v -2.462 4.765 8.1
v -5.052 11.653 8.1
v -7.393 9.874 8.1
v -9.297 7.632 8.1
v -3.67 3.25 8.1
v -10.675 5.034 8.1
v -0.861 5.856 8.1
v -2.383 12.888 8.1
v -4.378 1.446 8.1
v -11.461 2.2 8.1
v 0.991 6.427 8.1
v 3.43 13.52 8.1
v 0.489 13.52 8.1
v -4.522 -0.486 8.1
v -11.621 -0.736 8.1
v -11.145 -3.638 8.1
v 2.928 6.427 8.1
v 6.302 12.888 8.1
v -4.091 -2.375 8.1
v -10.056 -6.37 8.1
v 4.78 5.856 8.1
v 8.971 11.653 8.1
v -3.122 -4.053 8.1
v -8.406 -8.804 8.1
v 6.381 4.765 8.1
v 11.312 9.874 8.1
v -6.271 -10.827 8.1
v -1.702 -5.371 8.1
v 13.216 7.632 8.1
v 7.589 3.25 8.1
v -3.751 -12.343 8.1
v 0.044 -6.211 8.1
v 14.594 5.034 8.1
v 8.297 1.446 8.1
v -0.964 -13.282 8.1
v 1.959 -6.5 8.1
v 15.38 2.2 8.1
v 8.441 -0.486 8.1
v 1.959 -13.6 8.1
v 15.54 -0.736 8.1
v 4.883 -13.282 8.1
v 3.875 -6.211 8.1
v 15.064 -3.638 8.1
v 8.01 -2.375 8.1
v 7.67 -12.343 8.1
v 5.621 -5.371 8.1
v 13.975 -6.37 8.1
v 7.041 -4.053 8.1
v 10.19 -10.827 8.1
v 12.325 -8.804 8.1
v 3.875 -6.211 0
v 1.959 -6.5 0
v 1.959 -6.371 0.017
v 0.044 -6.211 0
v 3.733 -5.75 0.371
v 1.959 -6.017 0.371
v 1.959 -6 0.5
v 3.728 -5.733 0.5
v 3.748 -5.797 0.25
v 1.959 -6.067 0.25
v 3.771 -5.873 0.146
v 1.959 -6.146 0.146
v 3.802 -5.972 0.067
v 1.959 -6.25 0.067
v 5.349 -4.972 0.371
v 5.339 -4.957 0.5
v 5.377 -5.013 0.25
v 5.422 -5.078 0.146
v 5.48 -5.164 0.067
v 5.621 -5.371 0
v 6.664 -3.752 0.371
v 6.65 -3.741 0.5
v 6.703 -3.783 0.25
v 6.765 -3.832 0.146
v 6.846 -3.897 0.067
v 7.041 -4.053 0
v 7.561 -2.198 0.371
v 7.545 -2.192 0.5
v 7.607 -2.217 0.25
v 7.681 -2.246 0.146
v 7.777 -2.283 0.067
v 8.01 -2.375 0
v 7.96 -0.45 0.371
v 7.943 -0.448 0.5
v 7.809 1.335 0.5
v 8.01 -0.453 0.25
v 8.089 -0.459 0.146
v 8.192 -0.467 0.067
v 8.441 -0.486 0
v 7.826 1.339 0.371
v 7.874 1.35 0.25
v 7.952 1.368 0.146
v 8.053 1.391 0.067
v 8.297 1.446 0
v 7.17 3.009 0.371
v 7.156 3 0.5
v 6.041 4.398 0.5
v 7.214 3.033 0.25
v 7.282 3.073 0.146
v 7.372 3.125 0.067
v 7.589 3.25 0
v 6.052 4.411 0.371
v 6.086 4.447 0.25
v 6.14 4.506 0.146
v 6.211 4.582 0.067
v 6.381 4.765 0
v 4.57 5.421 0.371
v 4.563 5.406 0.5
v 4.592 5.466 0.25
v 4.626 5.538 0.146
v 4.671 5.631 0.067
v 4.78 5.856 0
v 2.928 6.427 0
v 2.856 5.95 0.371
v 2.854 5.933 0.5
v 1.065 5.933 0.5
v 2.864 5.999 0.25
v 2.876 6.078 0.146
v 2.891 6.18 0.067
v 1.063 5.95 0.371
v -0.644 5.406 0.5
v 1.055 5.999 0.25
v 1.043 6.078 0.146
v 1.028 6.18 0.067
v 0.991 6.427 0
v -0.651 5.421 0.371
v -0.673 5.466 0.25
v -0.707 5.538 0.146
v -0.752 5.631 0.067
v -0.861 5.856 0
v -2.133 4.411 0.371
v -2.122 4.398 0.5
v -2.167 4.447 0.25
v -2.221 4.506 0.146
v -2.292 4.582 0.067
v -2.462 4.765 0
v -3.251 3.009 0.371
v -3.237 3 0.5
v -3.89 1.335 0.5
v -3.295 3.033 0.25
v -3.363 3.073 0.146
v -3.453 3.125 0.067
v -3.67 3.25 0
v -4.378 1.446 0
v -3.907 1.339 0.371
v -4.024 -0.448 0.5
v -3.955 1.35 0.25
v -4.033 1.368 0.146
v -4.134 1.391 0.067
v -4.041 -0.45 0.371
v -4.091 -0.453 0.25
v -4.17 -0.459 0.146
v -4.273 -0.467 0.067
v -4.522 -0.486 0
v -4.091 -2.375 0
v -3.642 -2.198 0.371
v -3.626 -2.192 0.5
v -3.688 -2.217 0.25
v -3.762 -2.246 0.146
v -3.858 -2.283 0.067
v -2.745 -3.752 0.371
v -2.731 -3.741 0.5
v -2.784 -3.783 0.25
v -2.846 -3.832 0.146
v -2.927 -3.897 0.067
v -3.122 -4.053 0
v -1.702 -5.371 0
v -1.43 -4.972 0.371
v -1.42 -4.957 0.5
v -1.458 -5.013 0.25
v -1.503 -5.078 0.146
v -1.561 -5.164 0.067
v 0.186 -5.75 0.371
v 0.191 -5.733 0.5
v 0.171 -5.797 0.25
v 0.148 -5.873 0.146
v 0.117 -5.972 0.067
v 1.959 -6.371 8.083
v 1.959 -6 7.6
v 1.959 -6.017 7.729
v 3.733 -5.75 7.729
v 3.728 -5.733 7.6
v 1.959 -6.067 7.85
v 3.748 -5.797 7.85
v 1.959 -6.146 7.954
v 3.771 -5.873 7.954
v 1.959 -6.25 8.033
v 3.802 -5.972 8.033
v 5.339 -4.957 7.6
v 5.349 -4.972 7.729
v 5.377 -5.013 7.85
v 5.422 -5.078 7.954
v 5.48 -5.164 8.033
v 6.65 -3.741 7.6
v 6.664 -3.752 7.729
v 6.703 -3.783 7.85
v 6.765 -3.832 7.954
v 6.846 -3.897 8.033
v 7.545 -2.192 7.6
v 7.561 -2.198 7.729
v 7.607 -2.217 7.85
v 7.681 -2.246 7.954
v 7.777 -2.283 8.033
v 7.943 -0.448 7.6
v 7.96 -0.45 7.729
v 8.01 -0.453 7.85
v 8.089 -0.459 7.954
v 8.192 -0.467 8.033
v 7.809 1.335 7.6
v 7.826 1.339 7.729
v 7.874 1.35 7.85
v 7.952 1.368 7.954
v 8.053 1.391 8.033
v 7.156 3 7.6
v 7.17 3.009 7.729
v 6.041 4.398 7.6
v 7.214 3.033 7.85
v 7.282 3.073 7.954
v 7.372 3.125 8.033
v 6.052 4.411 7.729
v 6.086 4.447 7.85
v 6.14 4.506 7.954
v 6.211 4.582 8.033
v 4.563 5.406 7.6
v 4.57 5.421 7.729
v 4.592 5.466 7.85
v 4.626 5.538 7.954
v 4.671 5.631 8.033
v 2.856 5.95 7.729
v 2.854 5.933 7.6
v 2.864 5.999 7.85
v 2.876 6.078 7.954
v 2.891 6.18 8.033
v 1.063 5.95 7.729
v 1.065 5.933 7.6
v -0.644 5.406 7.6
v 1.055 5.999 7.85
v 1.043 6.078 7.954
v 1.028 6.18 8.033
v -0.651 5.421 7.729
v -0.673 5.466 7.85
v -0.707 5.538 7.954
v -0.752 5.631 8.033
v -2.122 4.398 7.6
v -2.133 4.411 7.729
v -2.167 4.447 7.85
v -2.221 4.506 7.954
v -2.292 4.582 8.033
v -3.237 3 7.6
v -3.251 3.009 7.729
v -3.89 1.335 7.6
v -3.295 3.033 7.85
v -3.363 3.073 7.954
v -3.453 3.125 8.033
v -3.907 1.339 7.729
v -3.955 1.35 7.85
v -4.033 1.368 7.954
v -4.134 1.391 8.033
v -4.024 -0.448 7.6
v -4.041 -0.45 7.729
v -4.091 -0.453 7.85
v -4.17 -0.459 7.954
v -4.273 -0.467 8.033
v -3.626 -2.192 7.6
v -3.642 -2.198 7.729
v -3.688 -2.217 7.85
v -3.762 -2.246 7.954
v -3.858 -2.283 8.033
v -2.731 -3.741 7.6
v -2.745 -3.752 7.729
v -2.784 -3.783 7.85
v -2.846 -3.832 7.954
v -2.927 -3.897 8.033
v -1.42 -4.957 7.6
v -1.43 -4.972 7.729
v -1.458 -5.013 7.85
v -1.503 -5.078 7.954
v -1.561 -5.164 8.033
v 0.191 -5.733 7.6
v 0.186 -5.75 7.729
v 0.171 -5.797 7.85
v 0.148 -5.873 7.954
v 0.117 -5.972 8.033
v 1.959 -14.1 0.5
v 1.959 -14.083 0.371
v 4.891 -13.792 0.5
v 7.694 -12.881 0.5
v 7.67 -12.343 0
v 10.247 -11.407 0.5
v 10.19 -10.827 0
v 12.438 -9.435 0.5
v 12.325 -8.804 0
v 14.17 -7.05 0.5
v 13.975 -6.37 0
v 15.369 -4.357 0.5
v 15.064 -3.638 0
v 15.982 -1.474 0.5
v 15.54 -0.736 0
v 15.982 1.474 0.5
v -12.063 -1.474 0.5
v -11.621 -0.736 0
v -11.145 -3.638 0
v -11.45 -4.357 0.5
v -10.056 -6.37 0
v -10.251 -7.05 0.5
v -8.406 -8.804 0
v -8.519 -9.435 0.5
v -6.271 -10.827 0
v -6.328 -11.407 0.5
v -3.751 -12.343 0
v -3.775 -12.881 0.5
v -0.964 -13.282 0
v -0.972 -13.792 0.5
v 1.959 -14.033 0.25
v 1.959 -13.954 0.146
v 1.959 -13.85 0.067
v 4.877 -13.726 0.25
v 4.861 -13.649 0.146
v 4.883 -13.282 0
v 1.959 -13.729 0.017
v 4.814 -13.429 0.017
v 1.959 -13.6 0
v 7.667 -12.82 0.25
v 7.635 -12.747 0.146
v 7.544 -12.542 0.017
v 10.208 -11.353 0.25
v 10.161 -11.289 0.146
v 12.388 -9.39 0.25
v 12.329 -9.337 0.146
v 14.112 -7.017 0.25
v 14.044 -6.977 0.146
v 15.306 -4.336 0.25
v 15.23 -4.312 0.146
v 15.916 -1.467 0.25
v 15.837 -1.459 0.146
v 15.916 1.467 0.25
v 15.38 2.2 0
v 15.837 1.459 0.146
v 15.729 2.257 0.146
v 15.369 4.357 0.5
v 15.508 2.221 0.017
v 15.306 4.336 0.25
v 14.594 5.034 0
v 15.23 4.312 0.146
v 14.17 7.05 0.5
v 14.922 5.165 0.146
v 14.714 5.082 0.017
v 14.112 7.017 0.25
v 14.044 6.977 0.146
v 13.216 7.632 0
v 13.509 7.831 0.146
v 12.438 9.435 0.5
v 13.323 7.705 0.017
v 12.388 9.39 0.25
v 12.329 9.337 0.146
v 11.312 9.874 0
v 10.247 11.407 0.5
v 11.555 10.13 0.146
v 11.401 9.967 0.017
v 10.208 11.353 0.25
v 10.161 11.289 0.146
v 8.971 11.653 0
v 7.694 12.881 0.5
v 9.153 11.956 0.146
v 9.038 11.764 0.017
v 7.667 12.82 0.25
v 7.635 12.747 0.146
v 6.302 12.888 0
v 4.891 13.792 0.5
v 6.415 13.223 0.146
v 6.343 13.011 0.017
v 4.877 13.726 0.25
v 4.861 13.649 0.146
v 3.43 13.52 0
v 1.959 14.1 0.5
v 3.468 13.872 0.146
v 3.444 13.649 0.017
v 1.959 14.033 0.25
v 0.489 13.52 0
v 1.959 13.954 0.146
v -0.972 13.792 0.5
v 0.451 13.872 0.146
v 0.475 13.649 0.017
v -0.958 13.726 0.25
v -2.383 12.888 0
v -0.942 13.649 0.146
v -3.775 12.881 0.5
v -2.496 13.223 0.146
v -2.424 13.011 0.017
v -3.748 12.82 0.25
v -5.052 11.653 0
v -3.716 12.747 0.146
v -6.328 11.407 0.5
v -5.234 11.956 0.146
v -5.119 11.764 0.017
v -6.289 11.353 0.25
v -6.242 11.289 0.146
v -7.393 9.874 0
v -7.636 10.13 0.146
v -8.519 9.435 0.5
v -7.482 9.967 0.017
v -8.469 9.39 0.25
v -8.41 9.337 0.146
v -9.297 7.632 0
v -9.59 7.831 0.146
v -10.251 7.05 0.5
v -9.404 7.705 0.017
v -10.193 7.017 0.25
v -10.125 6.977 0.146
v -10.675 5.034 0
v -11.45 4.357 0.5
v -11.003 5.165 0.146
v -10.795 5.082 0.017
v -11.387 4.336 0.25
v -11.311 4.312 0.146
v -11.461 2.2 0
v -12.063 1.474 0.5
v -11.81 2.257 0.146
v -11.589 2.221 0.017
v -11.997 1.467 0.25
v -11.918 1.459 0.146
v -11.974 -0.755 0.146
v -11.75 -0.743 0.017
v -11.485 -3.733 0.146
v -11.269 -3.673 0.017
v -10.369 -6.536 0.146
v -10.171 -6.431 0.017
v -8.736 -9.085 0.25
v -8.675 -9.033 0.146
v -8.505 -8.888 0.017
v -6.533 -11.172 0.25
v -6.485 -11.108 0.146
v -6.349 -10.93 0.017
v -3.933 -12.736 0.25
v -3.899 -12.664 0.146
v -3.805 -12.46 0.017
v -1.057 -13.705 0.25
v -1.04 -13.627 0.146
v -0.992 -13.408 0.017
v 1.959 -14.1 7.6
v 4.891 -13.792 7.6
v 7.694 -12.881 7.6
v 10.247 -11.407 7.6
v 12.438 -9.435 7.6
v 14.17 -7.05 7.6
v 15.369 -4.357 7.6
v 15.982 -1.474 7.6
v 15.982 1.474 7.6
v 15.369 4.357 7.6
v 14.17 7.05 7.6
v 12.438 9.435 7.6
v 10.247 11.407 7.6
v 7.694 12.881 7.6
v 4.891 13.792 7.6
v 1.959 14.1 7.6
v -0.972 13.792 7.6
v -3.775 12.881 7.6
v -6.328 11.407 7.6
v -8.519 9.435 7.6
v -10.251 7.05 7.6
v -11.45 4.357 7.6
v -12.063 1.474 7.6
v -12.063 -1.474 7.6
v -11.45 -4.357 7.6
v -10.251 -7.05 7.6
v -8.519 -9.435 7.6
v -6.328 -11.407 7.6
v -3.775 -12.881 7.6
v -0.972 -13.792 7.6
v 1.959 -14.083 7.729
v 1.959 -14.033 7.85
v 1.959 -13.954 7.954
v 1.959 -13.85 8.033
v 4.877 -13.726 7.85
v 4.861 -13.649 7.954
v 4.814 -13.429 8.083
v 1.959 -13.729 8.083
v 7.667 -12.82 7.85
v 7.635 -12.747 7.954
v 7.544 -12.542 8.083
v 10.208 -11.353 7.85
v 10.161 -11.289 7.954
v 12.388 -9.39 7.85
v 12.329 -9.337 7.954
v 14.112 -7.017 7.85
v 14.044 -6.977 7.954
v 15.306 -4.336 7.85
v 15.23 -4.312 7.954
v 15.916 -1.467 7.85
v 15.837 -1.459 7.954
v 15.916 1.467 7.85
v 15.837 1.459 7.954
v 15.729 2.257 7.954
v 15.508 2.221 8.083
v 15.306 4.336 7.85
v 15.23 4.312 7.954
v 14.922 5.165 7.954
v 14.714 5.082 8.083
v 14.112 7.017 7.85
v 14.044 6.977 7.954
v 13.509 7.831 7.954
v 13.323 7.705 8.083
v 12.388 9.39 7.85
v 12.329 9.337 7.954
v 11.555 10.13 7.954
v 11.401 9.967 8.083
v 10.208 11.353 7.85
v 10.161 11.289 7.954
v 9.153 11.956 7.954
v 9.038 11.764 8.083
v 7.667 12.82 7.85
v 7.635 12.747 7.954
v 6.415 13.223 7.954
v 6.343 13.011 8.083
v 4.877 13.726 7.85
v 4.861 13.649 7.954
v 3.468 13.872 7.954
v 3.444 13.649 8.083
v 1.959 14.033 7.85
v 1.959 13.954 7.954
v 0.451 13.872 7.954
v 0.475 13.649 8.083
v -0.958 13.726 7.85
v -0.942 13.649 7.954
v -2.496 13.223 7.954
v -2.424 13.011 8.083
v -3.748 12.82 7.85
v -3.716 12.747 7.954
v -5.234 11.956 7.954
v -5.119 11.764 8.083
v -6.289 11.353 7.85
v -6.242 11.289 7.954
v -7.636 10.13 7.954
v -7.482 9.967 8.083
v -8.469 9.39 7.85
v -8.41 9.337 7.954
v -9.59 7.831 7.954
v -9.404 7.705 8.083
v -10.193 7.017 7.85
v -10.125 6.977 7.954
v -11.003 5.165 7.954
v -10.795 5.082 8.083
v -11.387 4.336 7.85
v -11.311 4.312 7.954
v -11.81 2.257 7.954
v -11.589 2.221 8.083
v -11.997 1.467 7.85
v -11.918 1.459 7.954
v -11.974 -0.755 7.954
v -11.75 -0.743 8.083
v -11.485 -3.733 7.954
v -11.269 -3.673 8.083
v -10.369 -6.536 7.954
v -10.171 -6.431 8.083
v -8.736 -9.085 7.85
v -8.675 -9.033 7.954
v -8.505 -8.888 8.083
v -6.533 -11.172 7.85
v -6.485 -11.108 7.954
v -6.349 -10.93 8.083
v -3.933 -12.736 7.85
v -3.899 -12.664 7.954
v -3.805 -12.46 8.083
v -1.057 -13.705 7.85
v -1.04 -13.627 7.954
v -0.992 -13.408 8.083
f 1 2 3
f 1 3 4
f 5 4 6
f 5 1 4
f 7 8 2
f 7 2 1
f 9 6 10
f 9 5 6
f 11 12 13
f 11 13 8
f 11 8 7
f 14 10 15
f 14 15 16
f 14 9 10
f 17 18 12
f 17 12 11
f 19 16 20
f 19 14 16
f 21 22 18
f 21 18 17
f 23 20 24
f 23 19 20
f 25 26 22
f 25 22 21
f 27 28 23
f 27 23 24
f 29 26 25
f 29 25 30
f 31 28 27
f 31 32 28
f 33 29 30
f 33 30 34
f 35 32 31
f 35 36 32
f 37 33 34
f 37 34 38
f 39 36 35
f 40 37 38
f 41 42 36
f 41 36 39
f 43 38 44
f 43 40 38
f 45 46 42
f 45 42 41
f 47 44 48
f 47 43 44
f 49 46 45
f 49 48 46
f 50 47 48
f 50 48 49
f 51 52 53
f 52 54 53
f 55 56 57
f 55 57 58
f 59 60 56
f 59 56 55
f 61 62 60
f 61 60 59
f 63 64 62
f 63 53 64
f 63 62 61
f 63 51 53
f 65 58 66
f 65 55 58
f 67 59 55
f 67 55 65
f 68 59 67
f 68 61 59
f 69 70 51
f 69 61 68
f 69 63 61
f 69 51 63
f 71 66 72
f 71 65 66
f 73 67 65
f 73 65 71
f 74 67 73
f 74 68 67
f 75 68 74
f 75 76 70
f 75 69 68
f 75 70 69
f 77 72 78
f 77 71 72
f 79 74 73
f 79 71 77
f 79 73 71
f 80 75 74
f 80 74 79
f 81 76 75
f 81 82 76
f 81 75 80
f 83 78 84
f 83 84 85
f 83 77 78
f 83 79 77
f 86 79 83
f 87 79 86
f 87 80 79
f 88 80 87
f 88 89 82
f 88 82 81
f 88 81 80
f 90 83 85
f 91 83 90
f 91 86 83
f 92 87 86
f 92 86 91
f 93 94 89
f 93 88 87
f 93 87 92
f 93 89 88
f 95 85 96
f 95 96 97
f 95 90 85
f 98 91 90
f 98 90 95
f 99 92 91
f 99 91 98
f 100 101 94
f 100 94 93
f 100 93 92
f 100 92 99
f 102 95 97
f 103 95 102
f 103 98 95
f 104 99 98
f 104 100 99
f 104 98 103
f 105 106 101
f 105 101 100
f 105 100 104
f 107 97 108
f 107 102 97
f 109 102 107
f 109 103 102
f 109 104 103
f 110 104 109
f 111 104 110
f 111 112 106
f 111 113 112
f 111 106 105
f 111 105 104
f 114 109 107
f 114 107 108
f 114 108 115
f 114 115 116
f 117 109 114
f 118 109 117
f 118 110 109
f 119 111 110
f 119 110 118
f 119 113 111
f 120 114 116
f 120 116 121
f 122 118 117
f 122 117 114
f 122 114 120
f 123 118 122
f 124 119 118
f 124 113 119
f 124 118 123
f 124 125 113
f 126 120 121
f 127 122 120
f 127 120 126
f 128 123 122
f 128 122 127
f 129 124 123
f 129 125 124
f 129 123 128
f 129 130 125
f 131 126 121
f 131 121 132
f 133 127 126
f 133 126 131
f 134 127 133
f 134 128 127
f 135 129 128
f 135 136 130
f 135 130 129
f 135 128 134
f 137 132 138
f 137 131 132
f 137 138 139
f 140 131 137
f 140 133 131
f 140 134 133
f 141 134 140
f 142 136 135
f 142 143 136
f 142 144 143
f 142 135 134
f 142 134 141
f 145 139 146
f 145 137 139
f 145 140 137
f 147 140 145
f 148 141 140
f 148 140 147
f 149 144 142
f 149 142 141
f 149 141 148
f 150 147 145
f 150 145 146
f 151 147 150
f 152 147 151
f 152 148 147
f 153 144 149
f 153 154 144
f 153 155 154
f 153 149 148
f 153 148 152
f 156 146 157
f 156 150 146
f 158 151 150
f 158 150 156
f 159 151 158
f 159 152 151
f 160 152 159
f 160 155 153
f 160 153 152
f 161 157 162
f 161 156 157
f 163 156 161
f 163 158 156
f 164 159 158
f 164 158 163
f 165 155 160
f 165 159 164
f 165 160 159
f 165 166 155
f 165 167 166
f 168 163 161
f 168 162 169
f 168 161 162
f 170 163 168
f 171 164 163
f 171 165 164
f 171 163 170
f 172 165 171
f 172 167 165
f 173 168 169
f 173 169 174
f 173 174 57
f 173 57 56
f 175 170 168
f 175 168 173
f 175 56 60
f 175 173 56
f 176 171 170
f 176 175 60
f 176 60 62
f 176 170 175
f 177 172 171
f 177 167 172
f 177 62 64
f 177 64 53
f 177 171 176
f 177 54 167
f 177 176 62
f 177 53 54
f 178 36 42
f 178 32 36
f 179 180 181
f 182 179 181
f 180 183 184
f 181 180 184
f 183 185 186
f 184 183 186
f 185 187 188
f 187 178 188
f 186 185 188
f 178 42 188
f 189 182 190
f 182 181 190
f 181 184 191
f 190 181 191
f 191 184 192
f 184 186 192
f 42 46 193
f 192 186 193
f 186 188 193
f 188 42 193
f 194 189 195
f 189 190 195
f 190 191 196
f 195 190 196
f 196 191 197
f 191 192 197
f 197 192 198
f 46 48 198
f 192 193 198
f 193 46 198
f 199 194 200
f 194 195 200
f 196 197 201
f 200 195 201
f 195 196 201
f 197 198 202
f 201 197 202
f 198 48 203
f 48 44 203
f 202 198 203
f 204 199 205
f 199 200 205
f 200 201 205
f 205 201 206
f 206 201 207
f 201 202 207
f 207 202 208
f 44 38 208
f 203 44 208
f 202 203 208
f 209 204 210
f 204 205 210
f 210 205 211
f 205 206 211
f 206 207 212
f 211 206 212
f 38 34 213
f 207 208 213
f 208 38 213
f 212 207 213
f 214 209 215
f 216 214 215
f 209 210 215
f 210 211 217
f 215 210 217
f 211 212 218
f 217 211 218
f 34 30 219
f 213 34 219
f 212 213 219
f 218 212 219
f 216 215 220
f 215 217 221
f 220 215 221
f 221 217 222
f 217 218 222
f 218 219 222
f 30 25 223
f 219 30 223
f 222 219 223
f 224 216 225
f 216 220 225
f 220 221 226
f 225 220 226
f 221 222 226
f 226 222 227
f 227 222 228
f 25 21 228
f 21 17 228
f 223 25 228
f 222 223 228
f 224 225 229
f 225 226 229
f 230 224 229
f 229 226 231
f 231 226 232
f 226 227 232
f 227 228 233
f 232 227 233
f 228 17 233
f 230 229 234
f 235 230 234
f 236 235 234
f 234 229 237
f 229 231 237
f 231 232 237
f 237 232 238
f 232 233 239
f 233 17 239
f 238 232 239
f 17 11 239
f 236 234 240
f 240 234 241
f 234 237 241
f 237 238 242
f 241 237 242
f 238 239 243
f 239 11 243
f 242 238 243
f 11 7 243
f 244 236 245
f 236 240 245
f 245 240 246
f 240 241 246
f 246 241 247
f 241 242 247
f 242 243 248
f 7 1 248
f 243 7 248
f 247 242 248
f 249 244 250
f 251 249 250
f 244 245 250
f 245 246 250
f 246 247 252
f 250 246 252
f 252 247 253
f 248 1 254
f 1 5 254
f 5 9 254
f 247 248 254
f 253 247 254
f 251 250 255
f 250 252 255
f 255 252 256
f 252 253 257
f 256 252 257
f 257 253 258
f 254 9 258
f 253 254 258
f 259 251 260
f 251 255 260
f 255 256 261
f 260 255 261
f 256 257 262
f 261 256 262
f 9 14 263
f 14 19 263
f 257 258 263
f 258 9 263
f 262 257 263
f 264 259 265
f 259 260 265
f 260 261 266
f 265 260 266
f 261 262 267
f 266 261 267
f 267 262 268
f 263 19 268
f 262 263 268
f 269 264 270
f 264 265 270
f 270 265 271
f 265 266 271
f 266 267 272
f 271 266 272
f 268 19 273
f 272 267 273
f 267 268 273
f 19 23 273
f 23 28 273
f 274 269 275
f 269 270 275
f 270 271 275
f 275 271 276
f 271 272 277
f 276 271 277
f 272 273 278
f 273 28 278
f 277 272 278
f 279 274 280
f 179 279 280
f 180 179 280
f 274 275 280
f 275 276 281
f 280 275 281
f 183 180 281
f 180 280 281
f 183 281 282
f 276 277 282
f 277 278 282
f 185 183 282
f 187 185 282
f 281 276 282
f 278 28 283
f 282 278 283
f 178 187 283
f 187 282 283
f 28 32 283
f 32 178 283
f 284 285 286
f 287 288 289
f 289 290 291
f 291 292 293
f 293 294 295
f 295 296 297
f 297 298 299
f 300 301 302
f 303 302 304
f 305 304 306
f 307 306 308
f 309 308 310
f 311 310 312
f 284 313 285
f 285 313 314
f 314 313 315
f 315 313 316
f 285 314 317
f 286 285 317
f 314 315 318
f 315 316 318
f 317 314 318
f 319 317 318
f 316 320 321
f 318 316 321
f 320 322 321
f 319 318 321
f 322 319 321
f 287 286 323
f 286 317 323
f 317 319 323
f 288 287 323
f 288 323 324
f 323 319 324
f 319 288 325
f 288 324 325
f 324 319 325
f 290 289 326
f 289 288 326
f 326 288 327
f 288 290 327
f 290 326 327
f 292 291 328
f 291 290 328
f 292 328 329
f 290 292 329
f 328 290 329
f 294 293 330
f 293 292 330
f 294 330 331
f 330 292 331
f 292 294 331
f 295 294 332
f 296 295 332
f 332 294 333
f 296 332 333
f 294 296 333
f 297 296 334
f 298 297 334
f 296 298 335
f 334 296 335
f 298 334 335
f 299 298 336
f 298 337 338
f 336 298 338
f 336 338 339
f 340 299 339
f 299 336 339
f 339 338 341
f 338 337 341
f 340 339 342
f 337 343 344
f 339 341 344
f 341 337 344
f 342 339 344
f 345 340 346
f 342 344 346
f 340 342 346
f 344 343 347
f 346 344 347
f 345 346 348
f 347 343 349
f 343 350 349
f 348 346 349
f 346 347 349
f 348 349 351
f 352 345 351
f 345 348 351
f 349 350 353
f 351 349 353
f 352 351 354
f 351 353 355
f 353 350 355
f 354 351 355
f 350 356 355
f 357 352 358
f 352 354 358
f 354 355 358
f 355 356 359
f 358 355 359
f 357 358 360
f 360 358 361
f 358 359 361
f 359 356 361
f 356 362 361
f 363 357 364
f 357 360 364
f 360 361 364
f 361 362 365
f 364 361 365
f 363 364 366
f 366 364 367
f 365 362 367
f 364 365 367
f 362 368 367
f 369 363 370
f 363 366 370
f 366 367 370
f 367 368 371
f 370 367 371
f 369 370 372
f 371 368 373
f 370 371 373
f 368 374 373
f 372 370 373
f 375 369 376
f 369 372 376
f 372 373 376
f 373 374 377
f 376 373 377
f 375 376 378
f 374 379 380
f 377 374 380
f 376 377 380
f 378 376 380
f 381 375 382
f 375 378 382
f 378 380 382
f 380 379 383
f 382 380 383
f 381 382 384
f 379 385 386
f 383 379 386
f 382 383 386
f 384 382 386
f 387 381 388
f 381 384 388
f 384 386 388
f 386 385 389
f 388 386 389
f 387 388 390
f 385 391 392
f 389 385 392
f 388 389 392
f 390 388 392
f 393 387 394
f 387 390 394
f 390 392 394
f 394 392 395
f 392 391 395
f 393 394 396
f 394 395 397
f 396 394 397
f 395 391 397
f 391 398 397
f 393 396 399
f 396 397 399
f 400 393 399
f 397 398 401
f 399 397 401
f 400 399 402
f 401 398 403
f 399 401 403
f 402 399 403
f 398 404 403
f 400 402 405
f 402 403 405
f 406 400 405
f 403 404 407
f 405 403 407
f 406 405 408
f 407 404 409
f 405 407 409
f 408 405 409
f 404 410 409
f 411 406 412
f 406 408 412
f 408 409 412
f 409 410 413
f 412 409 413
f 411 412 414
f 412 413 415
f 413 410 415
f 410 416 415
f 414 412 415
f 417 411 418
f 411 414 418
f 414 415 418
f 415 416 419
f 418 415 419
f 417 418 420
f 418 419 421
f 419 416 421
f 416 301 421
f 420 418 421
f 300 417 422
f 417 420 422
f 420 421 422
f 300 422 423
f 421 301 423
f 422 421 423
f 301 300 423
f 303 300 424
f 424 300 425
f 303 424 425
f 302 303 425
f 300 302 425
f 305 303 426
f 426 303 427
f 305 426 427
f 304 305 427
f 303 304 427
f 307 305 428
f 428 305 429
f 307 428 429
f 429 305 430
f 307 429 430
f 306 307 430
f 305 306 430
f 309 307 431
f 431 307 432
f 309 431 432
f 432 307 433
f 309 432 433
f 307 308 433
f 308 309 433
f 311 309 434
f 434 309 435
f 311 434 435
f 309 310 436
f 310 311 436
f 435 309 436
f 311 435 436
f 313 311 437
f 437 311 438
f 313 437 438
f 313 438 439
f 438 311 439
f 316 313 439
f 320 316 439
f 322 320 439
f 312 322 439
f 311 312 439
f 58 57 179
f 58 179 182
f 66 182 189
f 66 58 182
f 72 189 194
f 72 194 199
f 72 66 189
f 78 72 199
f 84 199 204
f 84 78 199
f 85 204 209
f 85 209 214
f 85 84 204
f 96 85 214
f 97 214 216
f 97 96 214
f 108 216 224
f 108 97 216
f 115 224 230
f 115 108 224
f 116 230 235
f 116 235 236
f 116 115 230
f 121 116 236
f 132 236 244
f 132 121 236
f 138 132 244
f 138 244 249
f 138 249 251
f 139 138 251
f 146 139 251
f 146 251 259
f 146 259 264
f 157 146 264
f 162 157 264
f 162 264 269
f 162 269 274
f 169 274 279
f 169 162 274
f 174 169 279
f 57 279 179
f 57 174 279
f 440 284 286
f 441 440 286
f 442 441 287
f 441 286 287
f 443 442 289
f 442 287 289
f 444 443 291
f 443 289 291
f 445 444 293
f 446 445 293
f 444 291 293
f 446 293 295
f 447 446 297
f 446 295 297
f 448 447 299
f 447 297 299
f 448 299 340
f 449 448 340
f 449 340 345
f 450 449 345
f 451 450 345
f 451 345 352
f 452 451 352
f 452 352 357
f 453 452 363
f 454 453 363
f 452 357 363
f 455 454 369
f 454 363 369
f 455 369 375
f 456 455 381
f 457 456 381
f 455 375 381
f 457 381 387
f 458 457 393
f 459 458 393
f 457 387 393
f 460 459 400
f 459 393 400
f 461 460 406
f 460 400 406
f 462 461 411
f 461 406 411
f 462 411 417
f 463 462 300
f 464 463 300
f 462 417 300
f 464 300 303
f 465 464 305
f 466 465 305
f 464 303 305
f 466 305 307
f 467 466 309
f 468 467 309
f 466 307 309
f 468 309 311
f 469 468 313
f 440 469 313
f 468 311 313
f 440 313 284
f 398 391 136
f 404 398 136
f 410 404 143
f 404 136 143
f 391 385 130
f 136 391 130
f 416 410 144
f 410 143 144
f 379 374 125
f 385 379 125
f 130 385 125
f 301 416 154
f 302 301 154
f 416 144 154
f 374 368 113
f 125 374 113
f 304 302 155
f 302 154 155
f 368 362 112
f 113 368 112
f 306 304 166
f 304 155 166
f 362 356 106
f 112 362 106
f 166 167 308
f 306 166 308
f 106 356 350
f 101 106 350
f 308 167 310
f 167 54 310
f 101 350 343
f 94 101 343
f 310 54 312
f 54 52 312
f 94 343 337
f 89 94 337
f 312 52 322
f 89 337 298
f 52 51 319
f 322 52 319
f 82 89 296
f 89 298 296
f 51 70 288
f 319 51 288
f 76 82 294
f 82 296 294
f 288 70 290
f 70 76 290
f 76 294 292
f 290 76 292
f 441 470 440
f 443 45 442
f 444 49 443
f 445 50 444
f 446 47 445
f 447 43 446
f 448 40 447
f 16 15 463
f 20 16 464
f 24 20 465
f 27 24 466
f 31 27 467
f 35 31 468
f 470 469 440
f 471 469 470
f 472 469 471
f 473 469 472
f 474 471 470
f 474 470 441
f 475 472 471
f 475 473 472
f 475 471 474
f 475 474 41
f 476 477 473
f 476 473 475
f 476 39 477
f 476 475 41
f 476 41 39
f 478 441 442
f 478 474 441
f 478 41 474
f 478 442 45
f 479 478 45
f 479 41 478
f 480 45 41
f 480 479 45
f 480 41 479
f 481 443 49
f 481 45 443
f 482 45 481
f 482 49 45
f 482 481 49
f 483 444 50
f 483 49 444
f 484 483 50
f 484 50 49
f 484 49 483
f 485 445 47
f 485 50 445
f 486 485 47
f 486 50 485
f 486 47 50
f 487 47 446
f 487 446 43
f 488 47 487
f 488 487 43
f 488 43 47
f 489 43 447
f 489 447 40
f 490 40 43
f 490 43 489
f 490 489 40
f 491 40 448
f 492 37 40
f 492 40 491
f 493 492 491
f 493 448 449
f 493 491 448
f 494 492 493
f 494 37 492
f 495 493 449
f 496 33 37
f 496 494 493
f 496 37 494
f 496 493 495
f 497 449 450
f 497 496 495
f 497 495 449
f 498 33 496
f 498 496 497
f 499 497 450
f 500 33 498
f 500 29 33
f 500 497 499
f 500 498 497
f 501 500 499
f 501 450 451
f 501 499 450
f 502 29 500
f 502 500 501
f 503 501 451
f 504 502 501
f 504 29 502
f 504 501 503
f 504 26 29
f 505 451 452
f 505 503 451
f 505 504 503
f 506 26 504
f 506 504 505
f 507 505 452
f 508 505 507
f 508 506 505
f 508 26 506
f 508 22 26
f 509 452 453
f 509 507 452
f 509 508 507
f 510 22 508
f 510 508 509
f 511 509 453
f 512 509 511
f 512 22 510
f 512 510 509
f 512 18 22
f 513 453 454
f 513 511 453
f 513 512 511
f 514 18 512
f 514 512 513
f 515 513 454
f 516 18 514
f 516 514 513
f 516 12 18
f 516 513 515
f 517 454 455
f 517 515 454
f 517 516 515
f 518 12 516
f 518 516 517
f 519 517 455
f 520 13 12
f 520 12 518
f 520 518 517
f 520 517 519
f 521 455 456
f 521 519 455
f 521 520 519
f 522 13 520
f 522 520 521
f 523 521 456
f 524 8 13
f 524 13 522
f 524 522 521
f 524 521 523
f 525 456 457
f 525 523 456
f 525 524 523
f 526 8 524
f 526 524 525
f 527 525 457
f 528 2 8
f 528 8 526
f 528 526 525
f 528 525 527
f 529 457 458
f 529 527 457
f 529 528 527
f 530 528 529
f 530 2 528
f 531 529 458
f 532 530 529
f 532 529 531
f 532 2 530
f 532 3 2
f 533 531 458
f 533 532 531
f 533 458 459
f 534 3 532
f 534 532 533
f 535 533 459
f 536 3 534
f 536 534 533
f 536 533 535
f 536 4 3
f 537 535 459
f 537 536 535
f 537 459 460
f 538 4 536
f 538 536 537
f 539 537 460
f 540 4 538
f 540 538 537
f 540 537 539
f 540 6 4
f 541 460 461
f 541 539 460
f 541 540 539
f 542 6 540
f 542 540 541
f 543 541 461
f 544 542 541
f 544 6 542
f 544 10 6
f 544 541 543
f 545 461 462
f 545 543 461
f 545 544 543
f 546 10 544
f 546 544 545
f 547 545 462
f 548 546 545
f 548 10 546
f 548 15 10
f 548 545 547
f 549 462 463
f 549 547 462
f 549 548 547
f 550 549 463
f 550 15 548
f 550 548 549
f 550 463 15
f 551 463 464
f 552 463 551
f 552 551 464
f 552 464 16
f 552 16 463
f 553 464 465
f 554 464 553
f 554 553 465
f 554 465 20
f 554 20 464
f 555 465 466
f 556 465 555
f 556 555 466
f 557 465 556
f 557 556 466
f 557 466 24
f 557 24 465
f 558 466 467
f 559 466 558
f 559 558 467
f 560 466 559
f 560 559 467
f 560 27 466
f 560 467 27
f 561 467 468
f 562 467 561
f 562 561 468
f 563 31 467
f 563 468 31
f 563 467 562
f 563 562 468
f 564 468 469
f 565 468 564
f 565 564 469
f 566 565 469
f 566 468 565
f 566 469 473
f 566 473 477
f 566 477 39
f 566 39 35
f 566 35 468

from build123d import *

# Parameters (mm, degrees)
SKETCH1_R           = 14.1
SKETCH1_R_2         = 6
BOSS_EXTRUDE1_DEPTH = 8.1
FILLET1_R           = 0.5


with BuildPart() as part:
    # Sketch1 → Boss-Extrude1 (new body)
    with BuildSketch(Plane.XY):
        with Locations(Location((1.959493634, 6.335e-06, 0), (0, 0, 270))):
            Circle(SKETCH1_R)
        with Locations(Location((1.959493634, 6.335e-06, 0), (0, 0, 270))):
            Circle(SKETCH1_R_2, mode=Mode.SUBTRACT)
    extrude(amount=BOSS_EXTRUDE1_DEPTH)

    # Fillet1
    fillet1_edges = [part.edges().sort_by_distance(p)[0] for p in [
        (1.959493634, 14.100006335, 8.1),
        (1.959493634, 14.100006335, 0),
        (1.959493634, 6.000006335, 0),
        (1.959493634, 6.000006335, 8.1),
    ]]
    fillet(fillet1_edges, radius=FILLET1_R)


solid = part.part
